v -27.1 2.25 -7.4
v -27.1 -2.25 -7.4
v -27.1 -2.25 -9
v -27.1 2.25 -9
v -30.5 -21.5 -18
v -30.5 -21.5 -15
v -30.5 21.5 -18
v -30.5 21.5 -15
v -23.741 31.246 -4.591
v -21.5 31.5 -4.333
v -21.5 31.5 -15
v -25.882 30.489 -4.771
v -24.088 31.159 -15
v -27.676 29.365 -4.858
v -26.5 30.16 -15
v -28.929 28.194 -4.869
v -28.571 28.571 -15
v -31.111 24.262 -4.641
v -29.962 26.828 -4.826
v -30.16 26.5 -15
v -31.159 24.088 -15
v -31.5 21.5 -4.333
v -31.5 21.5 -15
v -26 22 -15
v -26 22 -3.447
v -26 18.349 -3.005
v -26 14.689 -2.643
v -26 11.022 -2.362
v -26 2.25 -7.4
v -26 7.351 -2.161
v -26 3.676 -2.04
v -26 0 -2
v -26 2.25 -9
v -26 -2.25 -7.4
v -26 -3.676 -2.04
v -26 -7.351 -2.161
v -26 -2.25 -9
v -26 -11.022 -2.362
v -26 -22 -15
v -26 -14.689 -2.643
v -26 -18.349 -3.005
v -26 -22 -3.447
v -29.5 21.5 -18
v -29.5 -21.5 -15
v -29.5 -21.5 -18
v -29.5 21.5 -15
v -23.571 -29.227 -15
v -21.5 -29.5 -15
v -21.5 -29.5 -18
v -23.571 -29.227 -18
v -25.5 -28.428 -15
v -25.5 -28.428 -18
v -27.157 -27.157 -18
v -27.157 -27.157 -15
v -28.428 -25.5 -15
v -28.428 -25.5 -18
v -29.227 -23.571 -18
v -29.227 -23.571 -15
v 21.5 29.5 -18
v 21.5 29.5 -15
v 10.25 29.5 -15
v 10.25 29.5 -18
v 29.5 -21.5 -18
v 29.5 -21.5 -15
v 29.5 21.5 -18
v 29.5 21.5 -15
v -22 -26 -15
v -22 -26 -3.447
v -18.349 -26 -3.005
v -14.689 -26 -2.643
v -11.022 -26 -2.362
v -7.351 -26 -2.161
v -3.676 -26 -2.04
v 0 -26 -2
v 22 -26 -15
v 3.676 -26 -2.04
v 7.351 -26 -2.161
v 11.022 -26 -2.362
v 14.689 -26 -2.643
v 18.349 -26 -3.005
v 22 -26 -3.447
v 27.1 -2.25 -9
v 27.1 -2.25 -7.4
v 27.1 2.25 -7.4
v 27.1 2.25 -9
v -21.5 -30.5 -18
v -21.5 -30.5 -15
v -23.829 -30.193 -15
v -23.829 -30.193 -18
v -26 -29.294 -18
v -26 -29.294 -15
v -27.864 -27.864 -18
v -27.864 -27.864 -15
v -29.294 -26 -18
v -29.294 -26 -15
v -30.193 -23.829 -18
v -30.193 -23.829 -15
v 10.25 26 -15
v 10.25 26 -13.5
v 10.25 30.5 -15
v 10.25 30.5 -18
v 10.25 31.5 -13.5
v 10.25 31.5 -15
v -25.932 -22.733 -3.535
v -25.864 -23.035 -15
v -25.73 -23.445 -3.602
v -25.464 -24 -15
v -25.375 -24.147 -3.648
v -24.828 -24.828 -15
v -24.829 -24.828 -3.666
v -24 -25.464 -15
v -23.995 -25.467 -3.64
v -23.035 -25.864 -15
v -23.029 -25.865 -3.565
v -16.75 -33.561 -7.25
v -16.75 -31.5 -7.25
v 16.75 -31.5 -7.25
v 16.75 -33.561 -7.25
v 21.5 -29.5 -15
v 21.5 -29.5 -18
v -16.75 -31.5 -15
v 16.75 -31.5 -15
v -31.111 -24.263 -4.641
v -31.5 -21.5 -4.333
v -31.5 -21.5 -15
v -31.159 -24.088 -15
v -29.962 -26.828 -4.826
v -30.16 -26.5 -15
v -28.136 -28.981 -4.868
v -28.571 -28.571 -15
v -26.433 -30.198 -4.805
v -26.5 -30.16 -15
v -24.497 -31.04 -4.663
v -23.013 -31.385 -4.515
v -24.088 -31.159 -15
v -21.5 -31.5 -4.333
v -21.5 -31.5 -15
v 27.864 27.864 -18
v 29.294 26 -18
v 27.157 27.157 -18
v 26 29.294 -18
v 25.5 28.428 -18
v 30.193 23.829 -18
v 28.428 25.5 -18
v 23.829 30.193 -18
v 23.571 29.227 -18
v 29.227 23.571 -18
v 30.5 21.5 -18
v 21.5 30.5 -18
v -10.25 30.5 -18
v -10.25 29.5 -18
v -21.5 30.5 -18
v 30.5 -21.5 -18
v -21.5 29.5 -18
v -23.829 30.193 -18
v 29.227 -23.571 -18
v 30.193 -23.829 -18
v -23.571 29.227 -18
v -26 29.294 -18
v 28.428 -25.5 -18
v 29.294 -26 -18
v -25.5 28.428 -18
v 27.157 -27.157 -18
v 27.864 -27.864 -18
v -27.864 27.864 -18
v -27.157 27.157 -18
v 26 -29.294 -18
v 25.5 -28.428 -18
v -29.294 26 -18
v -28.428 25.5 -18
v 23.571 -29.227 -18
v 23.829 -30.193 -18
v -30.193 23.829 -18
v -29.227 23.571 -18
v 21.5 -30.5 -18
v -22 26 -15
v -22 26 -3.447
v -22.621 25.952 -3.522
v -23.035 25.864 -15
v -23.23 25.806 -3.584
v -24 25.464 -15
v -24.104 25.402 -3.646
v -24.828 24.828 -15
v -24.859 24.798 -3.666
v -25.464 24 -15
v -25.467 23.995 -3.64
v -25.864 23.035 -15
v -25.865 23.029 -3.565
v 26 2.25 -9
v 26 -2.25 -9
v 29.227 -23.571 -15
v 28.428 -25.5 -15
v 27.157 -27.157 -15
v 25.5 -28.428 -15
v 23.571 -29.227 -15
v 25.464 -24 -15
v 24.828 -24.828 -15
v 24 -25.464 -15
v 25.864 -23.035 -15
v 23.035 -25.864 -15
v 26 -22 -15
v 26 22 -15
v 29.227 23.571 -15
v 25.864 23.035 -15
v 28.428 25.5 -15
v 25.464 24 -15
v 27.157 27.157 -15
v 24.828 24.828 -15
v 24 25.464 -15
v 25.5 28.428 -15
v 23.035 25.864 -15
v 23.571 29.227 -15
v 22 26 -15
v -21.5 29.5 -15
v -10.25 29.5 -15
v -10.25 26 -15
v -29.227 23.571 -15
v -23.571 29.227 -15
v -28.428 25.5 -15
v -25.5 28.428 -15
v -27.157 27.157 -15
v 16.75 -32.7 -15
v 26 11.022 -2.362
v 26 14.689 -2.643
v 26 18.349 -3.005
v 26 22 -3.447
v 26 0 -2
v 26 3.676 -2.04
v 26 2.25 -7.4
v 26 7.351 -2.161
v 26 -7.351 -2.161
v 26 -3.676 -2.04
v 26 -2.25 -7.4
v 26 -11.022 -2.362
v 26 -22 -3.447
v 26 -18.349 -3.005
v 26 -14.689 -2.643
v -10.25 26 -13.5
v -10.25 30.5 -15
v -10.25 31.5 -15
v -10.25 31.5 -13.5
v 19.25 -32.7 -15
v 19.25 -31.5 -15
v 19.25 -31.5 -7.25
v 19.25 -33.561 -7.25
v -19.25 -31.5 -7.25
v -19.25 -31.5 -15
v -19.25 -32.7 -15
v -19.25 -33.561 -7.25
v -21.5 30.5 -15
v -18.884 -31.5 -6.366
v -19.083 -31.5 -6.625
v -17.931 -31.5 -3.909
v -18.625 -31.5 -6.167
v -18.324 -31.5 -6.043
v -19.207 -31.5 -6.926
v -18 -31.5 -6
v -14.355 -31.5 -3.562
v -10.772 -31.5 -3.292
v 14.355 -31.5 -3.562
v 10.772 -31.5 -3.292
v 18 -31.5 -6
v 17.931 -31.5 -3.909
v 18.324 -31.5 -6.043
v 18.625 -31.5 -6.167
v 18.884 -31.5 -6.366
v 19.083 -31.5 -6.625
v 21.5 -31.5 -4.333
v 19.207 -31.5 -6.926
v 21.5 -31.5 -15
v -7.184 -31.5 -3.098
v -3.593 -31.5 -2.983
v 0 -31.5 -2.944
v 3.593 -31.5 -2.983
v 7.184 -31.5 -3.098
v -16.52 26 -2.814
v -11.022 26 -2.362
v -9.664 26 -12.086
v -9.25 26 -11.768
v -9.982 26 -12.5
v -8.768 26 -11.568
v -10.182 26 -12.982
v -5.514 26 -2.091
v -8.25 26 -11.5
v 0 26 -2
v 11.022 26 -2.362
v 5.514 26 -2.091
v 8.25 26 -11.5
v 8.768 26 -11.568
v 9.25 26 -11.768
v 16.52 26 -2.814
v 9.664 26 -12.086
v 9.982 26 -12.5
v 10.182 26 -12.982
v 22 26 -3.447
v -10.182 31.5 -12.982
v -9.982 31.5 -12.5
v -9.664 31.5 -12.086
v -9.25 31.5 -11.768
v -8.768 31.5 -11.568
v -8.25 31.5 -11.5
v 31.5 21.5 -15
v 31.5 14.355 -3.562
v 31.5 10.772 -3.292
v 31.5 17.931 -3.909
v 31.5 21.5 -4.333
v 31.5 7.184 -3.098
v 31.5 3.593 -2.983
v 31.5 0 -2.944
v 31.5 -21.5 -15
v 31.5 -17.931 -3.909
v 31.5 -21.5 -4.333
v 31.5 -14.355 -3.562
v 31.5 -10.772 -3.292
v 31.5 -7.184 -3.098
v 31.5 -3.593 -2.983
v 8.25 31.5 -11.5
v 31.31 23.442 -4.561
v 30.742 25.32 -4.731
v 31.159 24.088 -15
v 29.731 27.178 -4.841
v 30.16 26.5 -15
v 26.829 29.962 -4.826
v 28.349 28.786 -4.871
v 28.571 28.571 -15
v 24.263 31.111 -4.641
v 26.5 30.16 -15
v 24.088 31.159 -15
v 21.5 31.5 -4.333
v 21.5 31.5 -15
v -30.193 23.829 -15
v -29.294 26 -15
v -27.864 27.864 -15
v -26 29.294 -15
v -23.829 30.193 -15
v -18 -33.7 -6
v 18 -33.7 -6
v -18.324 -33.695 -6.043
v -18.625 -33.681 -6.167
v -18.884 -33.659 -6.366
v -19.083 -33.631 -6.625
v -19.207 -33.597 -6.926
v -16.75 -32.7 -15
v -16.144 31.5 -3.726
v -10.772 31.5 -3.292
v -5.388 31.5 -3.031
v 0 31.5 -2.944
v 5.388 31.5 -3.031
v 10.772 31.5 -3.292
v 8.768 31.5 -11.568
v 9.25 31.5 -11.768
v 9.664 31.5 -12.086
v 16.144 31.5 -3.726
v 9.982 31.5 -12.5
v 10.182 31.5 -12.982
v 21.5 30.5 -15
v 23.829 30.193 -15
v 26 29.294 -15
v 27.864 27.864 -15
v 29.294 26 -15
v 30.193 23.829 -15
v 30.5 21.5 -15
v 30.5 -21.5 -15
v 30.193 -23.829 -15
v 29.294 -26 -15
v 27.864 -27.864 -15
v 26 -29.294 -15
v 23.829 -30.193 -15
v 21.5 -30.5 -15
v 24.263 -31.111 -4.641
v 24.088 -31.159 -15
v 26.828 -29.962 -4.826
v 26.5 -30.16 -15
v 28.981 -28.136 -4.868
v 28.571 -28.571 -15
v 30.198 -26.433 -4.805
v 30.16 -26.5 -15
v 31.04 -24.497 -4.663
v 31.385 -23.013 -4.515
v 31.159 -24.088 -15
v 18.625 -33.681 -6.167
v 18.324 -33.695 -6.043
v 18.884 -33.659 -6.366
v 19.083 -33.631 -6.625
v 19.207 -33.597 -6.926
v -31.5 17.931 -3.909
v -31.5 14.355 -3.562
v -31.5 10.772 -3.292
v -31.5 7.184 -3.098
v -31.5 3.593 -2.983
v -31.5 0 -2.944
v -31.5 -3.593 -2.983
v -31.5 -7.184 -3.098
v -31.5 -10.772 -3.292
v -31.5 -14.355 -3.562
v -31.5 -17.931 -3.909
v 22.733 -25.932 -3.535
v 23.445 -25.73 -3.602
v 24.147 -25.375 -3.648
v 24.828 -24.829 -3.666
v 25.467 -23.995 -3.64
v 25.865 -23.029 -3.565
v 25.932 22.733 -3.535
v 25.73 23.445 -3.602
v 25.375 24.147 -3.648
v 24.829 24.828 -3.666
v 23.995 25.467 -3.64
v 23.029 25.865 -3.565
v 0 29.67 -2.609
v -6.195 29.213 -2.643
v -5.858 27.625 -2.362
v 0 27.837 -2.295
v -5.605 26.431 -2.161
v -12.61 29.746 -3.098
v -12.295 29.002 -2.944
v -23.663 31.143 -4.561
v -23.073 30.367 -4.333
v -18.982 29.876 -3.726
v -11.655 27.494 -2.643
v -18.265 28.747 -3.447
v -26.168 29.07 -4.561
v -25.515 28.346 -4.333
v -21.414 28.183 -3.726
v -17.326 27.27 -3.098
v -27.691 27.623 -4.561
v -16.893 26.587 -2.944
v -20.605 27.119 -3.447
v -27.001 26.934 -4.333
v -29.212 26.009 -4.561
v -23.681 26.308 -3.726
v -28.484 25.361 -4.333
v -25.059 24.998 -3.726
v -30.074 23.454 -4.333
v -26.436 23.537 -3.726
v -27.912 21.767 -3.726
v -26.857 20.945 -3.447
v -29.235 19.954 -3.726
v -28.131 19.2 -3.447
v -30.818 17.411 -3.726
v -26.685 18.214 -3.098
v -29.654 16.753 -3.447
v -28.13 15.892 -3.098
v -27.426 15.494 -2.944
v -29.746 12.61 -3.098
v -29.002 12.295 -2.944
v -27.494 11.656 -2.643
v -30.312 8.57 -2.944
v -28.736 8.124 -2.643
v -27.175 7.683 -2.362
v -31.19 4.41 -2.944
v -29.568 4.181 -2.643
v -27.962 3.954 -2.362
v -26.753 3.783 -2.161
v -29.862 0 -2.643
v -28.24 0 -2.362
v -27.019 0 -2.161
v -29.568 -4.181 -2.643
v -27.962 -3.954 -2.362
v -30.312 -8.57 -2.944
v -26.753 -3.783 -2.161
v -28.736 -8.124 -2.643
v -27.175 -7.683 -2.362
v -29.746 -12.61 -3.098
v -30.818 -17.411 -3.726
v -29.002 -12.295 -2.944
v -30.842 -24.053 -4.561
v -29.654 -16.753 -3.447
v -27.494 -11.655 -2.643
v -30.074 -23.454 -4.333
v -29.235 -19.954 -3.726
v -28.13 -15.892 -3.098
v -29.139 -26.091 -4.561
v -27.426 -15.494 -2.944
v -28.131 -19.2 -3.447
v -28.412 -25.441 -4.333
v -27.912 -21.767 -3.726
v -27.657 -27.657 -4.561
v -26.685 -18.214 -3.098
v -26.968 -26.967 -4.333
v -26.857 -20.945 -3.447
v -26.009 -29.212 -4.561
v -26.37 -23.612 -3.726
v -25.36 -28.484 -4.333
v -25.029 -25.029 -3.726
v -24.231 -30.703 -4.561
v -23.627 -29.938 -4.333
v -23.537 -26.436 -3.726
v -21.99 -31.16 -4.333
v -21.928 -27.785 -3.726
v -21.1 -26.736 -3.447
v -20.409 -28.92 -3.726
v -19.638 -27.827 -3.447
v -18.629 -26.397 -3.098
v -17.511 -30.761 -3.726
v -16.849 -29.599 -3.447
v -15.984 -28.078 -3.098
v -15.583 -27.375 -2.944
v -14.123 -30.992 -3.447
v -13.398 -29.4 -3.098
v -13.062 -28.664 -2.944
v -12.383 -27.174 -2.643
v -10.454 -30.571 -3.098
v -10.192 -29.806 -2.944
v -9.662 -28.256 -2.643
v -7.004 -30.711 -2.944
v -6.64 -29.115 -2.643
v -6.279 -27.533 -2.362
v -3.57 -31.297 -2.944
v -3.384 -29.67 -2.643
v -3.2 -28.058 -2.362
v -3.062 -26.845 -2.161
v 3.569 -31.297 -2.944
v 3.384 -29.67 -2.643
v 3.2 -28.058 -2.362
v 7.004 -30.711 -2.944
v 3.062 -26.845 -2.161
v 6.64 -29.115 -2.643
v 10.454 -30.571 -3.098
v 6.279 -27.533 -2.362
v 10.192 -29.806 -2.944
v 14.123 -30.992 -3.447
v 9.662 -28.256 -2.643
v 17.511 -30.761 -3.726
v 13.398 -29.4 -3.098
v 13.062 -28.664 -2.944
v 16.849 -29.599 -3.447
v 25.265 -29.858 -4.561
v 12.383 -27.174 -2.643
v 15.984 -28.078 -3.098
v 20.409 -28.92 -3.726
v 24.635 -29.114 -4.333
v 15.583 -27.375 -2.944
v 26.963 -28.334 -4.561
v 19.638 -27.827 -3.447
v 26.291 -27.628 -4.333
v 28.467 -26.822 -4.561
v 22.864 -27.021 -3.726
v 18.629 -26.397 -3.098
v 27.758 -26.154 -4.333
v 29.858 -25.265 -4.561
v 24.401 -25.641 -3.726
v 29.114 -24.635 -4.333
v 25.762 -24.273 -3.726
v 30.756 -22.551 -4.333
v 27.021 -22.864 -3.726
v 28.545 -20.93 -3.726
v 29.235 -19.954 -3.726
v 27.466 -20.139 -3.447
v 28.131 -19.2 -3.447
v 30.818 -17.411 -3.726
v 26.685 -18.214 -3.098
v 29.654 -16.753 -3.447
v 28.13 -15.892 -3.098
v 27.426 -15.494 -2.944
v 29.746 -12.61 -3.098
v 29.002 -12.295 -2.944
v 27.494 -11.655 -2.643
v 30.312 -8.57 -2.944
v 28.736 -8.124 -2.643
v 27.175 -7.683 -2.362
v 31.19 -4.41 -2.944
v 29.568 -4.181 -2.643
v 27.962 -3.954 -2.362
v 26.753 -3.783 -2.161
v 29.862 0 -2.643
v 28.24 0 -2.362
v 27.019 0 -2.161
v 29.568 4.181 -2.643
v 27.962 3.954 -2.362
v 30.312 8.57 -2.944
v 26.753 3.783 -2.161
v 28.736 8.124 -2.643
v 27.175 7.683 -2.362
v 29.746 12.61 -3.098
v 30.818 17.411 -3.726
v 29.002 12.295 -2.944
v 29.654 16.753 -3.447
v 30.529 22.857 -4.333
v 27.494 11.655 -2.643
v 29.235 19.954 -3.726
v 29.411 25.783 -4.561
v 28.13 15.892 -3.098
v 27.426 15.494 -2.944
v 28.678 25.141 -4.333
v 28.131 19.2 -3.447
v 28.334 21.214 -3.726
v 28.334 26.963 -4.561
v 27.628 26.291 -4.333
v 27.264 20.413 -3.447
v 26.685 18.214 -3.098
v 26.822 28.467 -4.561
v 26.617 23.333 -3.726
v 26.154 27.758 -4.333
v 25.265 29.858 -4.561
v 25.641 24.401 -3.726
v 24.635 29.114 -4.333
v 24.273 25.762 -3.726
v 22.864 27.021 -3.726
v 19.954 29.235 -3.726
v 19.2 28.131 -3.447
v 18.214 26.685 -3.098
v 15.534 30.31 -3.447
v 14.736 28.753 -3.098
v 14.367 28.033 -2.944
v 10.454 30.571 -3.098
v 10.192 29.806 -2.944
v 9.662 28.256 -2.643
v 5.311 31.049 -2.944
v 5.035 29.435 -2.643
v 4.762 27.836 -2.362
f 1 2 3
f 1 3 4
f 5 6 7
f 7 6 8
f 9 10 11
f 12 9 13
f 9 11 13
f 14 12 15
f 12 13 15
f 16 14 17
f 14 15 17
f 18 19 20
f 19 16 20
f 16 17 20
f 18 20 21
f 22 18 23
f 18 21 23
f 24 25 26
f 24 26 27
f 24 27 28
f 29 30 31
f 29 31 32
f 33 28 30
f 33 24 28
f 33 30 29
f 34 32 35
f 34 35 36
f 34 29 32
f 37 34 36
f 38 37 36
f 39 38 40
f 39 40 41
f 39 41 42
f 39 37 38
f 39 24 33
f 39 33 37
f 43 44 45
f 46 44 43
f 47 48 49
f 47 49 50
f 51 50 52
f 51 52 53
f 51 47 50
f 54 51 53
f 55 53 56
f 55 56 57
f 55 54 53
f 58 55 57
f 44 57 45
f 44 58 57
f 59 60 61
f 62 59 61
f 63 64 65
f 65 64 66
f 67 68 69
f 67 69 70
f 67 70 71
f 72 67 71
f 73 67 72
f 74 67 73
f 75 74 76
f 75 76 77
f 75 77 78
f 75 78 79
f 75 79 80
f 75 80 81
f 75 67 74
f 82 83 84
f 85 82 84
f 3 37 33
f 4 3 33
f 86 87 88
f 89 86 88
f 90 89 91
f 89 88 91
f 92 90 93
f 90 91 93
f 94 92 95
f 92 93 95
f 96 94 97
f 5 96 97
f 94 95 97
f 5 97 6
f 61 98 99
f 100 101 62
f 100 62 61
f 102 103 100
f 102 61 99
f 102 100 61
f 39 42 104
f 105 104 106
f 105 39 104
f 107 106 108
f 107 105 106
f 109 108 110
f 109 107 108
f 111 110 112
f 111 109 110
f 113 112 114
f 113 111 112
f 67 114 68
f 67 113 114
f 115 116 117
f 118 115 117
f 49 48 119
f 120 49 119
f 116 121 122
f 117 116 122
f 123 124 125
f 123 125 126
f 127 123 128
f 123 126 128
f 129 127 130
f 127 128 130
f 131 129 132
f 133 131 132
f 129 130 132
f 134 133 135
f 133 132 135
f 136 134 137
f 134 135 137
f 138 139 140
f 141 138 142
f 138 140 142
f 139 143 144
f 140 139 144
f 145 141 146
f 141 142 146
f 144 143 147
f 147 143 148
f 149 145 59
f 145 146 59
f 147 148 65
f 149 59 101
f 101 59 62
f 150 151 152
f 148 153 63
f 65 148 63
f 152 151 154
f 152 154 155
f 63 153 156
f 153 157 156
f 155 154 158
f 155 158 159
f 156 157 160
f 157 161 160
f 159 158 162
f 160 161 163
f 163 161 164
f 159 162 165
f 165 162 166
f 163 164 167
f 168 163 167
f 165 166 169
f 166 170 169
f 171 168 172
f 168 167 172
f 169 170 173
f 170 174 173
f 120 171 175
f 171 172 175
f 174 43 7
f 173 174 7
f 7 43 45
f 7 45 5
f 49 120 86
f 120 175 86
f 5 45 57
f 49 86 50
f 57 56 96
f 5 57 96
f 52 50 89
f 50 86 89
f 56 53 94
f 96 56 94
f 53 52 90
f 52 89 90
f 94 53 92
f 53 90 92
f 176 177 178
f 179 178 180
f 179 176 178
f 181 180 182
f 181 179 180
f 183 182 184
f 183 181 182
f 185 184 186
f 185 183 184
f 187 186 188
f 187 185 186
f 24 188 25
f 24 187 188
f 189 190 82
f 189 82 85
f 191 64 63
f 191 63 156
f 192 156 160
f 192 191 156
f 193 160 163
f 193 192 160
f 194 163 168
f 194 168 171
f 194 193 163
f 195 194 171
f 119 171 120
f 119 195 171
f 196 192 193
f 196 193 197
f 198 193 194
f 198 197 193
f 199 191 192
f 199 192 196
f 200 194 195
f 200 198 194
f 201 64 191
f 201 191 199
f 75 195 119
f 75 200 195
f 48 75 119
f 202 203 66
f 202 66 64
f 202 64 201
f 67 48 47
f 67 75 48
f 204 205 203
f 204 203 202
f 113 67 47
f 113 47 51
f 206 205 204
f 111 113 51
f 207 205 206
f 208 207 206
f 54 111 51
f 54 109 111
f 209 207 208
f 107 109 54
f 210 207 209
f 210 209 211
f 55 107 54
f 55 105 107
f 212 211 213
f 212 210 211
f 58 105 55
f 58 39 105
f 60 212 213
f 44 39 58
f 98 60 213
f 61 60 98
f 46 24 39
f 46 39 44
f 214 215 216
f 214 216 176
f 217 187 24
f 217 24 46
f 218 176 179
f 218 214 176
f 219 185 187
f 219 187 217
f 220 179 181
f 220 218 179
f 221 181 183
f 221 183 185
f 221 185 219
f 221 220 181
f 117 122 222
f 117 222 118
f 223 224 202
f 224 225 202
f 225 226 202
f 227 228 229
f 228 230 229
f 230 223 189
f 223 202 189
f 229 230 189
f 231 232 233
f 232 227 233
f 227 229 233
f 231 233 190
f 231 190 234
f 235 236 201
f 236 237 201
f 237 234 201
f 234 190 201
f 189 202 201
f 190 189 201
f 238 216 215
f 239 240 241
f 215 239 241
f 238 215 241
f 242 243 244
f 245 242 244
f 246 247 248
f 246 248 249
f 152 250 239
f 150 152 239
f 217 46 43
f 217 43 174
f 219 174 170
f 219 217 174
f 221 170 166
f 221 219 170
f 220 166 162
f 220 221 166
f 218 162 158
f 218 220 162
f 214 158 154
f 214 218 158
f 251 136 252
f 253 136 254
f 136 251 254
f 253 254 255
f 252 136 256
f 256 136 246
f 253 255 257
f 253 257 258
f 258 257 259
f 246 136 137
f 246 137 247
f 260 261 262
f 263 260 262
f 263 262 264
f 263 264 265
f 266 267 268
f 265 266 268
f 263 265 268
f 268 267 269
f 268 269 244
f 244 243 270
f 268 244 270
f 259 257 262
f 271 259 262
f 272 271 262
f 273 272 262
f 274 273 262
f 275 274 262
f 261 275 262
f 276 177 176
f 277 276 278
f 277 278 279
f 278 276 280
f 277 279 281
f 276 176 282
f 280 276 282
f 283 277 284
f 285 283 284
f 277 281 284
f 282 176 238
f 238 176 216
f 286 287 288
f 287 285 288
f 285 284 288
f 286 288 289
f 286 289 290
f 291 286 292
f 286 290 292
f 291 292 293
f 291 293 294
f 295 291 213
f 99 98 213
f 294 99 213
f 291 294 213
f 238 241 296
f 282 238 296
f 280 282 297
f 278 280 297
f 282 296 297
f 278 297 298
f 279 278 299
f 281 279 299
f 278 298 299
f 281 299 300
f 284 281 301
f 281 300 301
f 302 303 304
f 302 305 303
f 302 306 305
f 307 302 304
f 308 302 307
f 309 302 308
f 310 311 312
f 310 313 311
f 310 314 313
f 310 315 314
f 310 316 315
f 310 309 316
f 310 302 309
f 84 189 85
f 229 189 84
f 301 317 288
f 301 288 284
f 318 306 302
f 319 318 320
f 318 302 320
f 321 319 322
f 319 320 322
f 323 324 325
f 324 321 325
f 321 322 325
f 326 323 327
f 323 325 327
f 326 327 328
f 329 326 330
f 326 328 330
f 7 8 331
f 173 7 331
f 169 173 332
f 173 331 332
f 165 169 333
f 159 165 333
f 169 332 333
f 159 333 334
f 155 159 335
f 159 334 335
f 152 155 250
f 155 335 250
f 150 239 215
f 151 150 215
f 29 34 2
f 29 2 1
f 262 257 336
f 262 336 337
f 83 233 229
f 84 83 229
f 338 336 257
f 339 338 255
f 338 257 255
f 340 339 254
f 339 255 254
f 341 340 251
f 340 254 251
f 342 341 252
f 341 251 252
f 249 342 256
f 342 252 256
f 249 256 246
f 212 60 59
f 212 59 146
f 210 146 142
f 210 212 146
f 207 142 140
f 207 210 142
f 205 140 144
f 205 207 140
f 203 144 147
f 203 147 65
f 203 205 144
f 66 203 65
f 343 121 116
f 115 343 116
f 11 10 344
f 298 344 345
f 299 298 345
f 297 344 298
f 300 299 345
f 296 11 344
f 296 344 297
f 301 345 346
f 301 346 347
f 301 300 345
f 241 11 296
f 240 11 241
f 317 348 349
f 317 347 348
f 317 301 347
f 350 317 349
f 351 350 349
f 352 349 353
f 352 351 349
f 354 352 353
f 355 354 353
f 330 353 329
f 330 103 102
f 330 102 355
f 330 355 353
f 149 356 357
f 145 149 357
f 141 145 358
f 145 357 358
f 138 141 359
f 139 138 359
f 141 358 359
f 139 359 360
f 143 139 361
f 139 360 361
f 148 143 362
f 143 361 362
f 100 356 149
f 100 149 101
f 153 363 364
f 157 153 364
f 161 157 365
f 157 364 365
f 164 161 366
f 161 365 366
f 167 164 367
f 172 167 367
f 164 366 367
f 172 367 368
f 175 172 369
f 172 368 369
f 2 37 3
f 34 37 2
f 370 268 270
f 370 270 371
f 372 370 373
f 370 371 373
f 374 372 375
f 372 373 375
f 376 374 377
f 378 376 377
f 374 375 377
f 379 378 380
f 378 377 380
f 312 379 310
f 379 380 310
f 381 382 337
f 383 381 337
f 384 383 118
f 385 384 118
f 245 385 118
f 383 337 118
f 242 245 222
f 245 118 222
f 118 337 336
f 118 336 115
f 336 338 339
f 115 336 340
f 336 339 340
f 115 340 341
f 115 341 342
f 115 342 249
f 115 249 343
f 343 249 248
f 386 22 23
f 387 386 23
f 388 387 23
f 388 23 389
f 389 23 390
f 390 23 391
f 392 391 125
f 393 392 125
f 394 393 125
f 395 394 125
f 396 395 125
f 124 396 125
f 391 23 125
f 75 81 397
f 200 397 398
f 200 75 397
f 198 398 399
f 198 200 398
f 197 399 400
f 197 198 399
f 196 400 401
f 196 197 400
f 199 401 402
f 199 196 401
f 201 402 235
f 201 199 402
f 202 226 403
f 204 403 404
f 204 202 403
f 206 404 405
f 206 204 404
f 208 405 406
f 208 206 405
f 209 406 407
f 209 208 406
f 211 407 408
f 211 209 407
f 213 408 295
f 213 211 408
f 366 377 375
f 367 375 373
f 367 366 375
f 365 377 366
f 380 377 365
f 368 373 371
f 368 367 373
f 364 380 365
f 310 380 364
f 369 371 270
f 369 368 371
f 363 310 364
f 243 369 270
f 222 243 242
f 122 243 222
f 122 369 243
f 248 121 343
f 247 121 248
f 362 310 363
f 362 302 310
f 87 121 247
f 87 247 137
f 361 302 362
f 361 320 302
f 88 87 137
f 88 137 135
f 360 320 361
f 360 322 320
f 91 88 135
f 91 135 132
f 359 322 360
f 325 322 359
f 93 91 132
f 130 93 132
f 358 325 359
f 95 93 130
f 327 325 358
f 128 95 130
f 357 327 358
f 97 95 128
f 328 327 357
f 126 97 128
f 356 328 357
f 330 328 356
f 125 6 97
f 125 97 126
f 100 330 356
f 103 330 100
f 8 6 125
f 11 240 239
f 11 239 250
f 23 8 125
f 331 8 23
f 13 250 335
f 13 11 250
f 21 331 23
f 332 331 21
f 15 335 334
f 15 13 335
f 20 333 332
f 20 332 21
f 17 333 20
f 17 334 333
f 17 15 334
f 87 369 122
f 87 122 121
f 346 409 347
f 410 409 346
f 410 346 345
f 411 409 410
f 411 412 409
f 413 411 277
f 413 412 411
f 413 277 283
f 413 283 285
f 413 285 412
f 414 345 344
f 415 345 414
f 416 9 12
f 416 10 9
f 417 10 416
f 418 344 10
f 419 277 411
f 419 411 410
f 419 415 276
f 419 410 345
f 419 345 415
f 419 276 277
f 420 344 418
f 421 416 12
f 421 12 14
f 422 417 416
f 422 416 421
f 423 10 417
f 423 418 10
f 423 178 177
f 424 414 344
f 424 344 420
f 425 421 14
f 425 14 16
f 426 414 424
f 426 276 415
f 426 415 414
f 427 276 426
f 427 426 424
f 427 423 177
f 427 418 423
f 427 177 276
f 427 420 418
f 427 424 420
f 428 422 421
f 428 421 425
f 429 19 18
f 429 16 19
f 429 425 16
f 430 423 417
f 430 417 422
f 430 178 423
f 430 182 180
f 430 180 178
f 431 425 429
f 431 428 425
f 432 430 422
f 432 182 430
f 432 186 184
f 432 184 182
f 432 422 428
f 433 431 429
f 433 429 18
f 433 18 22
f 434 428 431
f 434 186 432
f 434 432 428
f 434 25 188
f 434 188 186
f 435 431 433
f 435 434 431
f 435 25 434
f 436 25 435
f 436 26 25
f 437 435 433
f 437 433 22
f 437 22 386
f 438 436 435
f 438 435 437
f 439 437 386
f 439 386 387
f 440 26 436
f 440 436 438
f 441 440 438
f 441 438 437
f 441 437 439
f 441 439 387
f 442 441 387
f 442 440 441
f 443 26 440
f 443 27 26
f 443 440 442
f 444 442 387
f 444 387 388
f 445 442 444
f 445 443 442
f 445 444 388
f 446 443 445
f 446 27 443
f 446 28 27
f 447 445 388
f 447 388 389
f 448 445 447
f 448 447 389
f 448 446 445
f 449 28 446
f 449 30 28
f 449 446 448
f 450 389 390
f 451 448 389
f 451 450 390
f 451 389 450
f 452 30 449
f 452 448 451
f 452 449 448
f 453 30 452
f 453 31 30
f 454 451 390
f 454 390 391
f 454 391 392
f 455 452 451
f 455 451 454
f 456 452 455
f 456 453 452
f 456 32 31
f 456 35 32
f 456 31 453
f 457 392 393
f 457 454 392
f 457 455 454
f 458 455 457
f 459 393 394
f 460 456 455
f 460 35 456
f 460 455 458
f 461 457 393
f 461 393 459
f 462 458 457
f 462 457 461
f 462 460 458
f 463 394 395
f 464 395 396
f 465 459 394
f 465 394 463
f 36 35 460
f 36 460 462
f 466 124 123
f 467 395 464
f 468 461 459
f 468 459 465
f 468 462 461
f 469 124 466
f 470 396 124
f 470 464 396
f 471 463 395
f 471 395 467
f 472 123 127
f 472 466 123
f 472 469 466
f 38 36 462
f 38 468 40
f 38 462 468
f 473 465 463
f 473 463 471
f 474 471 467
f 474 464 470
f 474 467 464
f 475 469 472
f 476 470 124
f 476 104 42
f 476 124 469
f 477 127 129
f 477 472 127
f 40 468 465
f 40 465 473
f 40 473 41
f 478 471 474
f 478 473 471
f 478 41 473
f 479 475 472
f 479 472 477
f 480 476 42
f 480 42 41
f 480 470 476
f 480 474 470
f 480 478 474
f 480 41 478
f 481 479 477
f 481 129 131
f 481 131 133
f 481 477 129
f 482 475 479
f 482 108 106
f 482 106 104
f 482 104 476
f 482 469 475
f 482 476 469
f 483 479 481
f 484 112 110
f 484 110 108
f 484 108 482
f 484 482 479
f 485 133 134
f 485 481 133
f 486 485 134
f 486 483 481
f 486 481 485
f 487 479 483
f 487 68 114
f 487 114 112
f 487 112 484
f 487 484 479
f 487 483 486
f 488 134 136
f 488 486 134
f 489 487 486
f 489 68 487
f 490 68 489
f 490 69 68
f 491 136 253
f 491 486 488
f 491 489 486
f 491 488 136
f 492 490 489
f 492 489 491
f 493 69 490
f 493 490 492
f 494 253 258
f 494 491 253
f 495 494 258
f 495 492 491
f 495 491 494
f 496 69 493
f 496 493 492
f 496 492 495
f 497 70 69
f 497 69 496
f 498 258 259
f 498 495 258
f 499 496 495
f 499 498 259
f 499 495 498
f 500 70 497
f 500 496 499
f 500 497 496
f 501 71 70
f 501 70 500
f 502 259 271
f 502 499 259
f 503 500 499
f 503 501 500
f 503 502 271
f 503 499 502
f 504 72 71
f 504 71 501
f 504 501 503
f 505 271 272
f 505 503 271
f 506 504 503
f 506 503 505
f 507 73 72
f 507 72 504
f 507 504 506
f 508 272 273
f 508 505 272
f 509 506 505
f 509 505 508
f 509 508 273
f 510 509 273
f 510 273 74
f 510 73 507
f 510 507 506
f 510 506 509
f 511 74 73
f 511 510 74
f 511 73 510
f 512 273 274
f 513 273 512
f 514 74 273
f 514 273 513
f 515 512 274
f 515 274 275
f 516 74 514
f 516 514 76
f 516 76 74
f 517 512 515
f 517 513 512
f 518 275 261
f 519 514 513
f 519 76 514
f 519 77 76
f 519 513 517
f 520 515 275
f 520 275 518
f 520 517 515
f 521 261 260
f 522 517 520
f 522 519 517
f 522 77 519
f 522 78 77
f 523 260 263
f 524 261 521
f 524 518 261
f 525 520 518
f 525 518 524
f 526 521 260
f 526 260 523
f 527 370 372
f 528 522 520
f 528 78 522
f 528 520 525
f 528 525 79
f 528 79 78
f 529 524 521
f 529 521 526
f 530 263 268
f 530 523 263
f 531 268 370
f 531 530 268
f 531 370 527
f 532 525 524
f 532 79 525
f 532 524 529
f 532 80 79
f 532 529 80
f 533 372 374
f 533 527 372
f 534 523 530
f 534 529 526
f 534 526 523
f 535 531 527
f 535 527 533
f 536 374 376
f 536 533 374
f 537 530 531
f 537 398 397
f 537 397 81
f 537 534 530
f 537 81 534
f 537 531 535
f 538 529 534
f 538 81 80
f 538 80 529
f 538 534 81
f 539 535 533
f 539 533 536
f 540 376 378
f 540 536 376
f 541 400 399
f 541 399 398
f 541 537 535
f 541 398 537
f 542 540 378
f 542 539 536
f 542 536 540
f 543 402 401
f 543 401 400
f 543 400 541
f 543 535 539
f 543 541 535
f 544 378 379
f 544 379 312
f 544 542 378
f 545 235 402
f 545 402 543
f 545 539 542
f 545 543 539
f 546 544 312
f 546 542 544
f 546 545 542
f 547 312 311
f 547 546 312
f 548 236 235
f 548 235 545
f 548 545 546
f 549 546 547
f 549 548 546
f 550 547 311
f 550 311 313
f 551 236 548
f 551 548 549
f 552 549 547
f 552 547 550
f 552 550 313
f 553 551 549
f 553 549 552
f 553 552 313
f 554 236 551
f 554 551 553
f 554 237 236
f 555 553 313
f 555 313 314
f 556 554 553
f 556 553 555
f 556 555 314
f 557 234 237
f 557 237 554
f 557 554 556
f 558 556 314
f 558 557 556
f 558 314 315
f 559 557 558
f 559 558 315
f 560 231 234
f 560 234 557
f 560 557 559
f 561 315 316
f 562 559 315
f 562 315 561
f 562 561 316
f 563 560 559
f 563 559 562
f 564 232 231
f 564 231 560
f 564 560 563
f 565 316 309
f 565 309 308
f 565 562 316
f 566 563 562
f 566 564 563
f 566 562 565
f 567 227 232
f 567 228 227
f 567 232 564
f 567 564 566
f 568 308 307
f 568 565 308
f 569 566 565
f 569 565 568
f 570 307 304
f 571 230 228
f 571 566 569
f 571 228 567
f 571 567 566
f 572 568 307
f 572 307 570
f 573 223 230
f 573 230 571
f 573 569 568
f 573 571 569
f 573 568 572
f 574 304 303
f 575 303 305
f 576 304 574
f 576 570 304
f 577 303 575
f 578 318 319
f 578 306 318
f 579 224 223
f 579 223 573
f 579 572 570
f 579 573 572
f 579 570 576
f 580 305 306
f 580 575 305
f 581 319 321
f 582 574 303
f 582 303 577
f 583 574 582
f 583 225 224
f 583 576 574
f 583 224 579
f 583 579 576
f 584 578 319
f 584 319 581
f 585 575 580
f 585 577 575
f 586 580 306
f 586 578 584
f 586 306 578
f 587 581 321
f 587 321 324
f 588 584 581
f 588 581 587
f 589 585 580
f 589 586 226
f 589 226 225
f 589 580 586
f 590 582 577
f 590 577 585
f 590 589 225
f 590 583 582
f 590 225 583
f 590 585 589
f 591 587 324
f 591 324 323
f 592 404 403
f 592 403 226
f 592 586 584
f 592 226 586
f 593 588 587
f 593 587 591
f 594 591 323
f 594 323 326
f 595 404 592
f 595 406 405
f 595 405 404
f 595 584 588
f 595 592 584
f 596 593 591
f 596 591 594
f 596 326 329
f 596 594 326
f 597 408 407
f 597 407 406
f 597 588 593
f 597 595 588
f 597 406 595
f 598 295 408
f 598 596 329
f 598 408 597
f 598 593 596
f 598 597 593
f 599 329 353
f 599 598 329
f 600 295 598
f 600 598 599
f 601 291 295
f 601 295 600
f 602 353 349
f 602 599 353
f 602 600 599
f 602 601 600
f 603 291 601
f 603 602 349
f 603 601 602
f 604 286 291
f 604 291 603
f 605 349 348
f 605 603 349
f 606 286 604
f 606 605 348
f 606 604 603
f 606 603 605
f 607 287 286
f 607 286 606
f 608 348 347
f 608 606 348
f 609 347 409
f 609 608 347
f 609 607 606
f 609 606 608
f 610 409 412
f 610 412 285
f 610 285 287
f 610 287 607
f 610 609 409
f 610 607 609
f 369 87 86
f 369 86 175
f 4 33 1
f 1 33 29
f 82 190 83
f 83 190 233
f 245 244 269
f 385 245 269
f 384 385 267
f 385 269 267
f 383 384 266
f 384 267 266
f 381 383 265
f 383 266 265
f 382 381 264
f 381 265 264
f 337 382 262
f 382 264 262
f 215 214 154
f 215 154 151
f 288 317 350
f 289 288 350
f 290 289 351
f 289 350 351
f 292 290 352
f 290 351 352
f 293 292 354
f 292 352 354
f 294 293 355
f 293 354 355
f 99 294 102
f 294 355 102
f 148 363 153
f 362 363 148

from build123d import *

# Parameters (mm, degrees)
PAD_DEPTH       = 15
SKETCH_W        = 4.5
SKETCH_H        = 1.6
POCKET_DEPTH    = 1.1
POCKET001_DEPTH = 5.499984
PAD001_DEPTH    = 5
POCKET002_DEPTH = 50.750998
PAD002_DEPTH    = 3


with BuildPart() as limit_walls:
    # Sketch002 → Revolution001 (revolve)
    with BuildSketch(Plane.YZ):
        with BuildLine():
            ThreePointArc((60, -10.940263), (30.494628, -2.757429), (0, 0))
            Line((0, 10), (0, 0))
            ThreePointArc((63.529412, -1.583808), (32.28843, 7.08037), (0, 10))
            Line((63.529412, -1.583808), (60, -10.940263))
        make_face()
    revolve(axis=Axis((0, 0, 0), (0, 0, 1)))


with BuildPart() as cut:
    # Sketch001 → Pad (new body)
    with BuildSketch(Plane.XY.offset(-15)):
        with BuildLine():
            Line((-21.499971, 31.499984), (21.499999, 31.499984))
            ThreePointArc((31.499998, 21.499986), (28.571066, 28.571052), (21.499999, 31.499984))
            Line((31.499998, 21.499986), (31.499998, -21.499984))
            ThreePointArc((21.499971, -31.499984), (28.571056, -28.571062), (31.499998, -21.499984))
            Line((-21.499999, -31.499984), (21.499971, -31.499984))
            ThreePointArc((-31.500002, -21.499984), (-28.571069, -28.571053), (-21.499999, -31.499984))
            Line((-31.500002, 21.499986), (-31.500002, -21.499984))
            ThreePointArc((-21.499971, 31.499984), (-28.571058, 28.571064), (-31.500002, 21.499986))
        make_face()
        with BuildLine():
            Line((-22, 26), (22, 26))
            ThreePointArc((26, 22), (24.828427, 24.828427), (22, 26))
            Line((26, 22), (26, -22))
            ThreePointArc((22, -26), (24.828427, -24.828427), (26, -22))
            Line((-22, -26), (22, -26))
            ThreePointArc((-26, -21.99998), (-24.828434, -24.82842), (-22, -26))
            Line((-26, 22.000021), (-26, -21.99998))
            ThreePointArc((-22, 26), (-24.82842, 24.828435), (-26, 22.000021))
        make_face(mode=Mode.SUBTRACT)
    extrude(amount=PAD_DEPTH)

    # Sketch (on Face9 of Pad) → Pocket (cut)
    with BuildSketch(Plane.YZ.offset(-26)):
        with Locations((0, -8.2)):
            Rectangle(SKETCH_W, SKETCH_H)
    pocket = extrude(amount=-POCKET_DEPTH, mode=Mode.SUBTRACT)

    # Mirrored: Pocket across YZ
    add(pocket.mirror(Plane.YZ), mode=Mode.SUBTRACT)

    # Sketch003 (on Face2 of Mirrored) → Pocket001 (cut)
    with BuildSketch(Plane(origin=(0, 31.499984, 0), x_dir=(-1, 0, 0), z_dir=(0, 1, 0))):
        with BuildLine():
            Line((-10.25, -15), (-10.25, -13.500001))
            ThreePointArc((-8.249997, -11.5), (-9.664212, -12.085786), (-10.25, -13.500001))
            Line((-8.249997, -11.5), (8.249997, -11.5))
            ThreePointArc((10.249996, -13.500001), (9.66421, -12.085787), (8.249997, -11.5))
            Line((10.25, -15), (10.249996, -13.500001))
            Line((-10.25, -15), (10.25, -15))
        make_face()
    extrude(amount=-POCKET001_DEPTH, mode=Mode.SUBTRACT)

    # Sketch004 (on Face13 of Pocket001) → Pad001 (join)
    with BuildSketch(Plane.XZ.offset(31.499984)):
        with BuildLine():
            Line((-19.25, -15), (-19.25, -7.25))
            ThreePointArc((-18, -6), (-18.883883, -6.366117), (-19.25, -7.25))
            Line((-18, -6), (18, -6))
            ThreePointArc((19.25, -7.25), (18.883883, -6.366117), (18, -6))
            Line((19.25, -15), (19.25, -7.25))
            Line((16.75, -15), (19.25, -15))
            Line((16.75, -15), (16.75, -7.25))
            Line((-16.75, -7.25), (16.75, -7.25))
            Line((-16.75, -15), (-16.75, -7.25))
            Line((-19.25, -15), (-16.75, -15))
        make_face()
    extrude(amount=PAD001_DEPTH)

    # Sketch005 (on Face27 of Pad001) → Pocket002 (cut, through all)
    with BuildSketch(Plane(origin=(-19.25, 0, 0), x_dir=(0, -1, 0), z_dir=(-1, 0, 0))):
        Polygon((33.699984, -6), (32.699984, -15), (36.499984, -15), (36.499984, -6), align=None)
    extrude(amount=-POCKET002_DEPTH, mode=Mode.SUBTRACT)

    # Sketch006 (on Face4 of Pocket002) → Pad002 (join)
    with BuildSketch(Plane(origin=(0, 0, -15), x_dir=(1, 0, 0), z_dir=(0, 0, -1))):
        with BuildLine():
            Line((-21.499999, 30.499984), (21.499999, 30.499984))
            ThreePointArc((30.499997, 21.499984), (27.863964, 27.86395), (21.499999, 30.499984))
            Line((30.499997, 21.499984), (30.499997, -21.499984))
            ThreePointArc((21.500015, -30.499984), (27.86397, -27.863944), (30.499997, -21.499984))
            Line((21.500015, -30.499984), (10.25, -30.499984))
            Line((10.25, -29.499984), (10.25, -30.499984))
            Line((21.500015, -29.499984), (10.25, -29.499984))
            ThreePointArc((21.500015, -29.499984), (27.156863, -27.156837), (29.499997, -21.499984))
            Line((29.499997, 21.499984), (29.499997, -21.499984))
            ThreePointArc((29.499997, 21.499984), (27.156857, 27.156843), (21.499999, 29.499984))
            Line((-21.499999, 29.499984), (21.499999, 29.499984))
            ThreePointArc((-21.499999, 29.499984), (-27.156852, 27.156838), (-29.499997, 21.499984))
            Line((-29.499997, 21.499984), (-29.499997, -21.499984))
            ThreePointArc((-29.499997, -21.499984), (-27.156863, -27.156837), (-21.500016, -29.499984))
            Line((-21.500016, -29.499984), (-10.25, -29.499984))
            Line((-10.25, -30.499984), (-10.25, -29.499984))
            Line((-21.500015, -30.499984), (-10.25, -30.499984))
            ThreePointArc((-30.499997, -21.499984), (-27.86397, -27.863944), (-21.500015, -30.499984))
            Line((-30.499997, 21.499984), (-30.499997, -21.499984))
            ThreePointArc((-21.499999, 30.499984), (-27.863964, 27.86395), (-30.499997, 21.499984))
        make_face()
    extrude(amount=PAD002_DEPTH)

    # Cut: cut limit_walls
    add(limit_walls.part, mode=Mode.SUBTRACT)


solid = cut.part
